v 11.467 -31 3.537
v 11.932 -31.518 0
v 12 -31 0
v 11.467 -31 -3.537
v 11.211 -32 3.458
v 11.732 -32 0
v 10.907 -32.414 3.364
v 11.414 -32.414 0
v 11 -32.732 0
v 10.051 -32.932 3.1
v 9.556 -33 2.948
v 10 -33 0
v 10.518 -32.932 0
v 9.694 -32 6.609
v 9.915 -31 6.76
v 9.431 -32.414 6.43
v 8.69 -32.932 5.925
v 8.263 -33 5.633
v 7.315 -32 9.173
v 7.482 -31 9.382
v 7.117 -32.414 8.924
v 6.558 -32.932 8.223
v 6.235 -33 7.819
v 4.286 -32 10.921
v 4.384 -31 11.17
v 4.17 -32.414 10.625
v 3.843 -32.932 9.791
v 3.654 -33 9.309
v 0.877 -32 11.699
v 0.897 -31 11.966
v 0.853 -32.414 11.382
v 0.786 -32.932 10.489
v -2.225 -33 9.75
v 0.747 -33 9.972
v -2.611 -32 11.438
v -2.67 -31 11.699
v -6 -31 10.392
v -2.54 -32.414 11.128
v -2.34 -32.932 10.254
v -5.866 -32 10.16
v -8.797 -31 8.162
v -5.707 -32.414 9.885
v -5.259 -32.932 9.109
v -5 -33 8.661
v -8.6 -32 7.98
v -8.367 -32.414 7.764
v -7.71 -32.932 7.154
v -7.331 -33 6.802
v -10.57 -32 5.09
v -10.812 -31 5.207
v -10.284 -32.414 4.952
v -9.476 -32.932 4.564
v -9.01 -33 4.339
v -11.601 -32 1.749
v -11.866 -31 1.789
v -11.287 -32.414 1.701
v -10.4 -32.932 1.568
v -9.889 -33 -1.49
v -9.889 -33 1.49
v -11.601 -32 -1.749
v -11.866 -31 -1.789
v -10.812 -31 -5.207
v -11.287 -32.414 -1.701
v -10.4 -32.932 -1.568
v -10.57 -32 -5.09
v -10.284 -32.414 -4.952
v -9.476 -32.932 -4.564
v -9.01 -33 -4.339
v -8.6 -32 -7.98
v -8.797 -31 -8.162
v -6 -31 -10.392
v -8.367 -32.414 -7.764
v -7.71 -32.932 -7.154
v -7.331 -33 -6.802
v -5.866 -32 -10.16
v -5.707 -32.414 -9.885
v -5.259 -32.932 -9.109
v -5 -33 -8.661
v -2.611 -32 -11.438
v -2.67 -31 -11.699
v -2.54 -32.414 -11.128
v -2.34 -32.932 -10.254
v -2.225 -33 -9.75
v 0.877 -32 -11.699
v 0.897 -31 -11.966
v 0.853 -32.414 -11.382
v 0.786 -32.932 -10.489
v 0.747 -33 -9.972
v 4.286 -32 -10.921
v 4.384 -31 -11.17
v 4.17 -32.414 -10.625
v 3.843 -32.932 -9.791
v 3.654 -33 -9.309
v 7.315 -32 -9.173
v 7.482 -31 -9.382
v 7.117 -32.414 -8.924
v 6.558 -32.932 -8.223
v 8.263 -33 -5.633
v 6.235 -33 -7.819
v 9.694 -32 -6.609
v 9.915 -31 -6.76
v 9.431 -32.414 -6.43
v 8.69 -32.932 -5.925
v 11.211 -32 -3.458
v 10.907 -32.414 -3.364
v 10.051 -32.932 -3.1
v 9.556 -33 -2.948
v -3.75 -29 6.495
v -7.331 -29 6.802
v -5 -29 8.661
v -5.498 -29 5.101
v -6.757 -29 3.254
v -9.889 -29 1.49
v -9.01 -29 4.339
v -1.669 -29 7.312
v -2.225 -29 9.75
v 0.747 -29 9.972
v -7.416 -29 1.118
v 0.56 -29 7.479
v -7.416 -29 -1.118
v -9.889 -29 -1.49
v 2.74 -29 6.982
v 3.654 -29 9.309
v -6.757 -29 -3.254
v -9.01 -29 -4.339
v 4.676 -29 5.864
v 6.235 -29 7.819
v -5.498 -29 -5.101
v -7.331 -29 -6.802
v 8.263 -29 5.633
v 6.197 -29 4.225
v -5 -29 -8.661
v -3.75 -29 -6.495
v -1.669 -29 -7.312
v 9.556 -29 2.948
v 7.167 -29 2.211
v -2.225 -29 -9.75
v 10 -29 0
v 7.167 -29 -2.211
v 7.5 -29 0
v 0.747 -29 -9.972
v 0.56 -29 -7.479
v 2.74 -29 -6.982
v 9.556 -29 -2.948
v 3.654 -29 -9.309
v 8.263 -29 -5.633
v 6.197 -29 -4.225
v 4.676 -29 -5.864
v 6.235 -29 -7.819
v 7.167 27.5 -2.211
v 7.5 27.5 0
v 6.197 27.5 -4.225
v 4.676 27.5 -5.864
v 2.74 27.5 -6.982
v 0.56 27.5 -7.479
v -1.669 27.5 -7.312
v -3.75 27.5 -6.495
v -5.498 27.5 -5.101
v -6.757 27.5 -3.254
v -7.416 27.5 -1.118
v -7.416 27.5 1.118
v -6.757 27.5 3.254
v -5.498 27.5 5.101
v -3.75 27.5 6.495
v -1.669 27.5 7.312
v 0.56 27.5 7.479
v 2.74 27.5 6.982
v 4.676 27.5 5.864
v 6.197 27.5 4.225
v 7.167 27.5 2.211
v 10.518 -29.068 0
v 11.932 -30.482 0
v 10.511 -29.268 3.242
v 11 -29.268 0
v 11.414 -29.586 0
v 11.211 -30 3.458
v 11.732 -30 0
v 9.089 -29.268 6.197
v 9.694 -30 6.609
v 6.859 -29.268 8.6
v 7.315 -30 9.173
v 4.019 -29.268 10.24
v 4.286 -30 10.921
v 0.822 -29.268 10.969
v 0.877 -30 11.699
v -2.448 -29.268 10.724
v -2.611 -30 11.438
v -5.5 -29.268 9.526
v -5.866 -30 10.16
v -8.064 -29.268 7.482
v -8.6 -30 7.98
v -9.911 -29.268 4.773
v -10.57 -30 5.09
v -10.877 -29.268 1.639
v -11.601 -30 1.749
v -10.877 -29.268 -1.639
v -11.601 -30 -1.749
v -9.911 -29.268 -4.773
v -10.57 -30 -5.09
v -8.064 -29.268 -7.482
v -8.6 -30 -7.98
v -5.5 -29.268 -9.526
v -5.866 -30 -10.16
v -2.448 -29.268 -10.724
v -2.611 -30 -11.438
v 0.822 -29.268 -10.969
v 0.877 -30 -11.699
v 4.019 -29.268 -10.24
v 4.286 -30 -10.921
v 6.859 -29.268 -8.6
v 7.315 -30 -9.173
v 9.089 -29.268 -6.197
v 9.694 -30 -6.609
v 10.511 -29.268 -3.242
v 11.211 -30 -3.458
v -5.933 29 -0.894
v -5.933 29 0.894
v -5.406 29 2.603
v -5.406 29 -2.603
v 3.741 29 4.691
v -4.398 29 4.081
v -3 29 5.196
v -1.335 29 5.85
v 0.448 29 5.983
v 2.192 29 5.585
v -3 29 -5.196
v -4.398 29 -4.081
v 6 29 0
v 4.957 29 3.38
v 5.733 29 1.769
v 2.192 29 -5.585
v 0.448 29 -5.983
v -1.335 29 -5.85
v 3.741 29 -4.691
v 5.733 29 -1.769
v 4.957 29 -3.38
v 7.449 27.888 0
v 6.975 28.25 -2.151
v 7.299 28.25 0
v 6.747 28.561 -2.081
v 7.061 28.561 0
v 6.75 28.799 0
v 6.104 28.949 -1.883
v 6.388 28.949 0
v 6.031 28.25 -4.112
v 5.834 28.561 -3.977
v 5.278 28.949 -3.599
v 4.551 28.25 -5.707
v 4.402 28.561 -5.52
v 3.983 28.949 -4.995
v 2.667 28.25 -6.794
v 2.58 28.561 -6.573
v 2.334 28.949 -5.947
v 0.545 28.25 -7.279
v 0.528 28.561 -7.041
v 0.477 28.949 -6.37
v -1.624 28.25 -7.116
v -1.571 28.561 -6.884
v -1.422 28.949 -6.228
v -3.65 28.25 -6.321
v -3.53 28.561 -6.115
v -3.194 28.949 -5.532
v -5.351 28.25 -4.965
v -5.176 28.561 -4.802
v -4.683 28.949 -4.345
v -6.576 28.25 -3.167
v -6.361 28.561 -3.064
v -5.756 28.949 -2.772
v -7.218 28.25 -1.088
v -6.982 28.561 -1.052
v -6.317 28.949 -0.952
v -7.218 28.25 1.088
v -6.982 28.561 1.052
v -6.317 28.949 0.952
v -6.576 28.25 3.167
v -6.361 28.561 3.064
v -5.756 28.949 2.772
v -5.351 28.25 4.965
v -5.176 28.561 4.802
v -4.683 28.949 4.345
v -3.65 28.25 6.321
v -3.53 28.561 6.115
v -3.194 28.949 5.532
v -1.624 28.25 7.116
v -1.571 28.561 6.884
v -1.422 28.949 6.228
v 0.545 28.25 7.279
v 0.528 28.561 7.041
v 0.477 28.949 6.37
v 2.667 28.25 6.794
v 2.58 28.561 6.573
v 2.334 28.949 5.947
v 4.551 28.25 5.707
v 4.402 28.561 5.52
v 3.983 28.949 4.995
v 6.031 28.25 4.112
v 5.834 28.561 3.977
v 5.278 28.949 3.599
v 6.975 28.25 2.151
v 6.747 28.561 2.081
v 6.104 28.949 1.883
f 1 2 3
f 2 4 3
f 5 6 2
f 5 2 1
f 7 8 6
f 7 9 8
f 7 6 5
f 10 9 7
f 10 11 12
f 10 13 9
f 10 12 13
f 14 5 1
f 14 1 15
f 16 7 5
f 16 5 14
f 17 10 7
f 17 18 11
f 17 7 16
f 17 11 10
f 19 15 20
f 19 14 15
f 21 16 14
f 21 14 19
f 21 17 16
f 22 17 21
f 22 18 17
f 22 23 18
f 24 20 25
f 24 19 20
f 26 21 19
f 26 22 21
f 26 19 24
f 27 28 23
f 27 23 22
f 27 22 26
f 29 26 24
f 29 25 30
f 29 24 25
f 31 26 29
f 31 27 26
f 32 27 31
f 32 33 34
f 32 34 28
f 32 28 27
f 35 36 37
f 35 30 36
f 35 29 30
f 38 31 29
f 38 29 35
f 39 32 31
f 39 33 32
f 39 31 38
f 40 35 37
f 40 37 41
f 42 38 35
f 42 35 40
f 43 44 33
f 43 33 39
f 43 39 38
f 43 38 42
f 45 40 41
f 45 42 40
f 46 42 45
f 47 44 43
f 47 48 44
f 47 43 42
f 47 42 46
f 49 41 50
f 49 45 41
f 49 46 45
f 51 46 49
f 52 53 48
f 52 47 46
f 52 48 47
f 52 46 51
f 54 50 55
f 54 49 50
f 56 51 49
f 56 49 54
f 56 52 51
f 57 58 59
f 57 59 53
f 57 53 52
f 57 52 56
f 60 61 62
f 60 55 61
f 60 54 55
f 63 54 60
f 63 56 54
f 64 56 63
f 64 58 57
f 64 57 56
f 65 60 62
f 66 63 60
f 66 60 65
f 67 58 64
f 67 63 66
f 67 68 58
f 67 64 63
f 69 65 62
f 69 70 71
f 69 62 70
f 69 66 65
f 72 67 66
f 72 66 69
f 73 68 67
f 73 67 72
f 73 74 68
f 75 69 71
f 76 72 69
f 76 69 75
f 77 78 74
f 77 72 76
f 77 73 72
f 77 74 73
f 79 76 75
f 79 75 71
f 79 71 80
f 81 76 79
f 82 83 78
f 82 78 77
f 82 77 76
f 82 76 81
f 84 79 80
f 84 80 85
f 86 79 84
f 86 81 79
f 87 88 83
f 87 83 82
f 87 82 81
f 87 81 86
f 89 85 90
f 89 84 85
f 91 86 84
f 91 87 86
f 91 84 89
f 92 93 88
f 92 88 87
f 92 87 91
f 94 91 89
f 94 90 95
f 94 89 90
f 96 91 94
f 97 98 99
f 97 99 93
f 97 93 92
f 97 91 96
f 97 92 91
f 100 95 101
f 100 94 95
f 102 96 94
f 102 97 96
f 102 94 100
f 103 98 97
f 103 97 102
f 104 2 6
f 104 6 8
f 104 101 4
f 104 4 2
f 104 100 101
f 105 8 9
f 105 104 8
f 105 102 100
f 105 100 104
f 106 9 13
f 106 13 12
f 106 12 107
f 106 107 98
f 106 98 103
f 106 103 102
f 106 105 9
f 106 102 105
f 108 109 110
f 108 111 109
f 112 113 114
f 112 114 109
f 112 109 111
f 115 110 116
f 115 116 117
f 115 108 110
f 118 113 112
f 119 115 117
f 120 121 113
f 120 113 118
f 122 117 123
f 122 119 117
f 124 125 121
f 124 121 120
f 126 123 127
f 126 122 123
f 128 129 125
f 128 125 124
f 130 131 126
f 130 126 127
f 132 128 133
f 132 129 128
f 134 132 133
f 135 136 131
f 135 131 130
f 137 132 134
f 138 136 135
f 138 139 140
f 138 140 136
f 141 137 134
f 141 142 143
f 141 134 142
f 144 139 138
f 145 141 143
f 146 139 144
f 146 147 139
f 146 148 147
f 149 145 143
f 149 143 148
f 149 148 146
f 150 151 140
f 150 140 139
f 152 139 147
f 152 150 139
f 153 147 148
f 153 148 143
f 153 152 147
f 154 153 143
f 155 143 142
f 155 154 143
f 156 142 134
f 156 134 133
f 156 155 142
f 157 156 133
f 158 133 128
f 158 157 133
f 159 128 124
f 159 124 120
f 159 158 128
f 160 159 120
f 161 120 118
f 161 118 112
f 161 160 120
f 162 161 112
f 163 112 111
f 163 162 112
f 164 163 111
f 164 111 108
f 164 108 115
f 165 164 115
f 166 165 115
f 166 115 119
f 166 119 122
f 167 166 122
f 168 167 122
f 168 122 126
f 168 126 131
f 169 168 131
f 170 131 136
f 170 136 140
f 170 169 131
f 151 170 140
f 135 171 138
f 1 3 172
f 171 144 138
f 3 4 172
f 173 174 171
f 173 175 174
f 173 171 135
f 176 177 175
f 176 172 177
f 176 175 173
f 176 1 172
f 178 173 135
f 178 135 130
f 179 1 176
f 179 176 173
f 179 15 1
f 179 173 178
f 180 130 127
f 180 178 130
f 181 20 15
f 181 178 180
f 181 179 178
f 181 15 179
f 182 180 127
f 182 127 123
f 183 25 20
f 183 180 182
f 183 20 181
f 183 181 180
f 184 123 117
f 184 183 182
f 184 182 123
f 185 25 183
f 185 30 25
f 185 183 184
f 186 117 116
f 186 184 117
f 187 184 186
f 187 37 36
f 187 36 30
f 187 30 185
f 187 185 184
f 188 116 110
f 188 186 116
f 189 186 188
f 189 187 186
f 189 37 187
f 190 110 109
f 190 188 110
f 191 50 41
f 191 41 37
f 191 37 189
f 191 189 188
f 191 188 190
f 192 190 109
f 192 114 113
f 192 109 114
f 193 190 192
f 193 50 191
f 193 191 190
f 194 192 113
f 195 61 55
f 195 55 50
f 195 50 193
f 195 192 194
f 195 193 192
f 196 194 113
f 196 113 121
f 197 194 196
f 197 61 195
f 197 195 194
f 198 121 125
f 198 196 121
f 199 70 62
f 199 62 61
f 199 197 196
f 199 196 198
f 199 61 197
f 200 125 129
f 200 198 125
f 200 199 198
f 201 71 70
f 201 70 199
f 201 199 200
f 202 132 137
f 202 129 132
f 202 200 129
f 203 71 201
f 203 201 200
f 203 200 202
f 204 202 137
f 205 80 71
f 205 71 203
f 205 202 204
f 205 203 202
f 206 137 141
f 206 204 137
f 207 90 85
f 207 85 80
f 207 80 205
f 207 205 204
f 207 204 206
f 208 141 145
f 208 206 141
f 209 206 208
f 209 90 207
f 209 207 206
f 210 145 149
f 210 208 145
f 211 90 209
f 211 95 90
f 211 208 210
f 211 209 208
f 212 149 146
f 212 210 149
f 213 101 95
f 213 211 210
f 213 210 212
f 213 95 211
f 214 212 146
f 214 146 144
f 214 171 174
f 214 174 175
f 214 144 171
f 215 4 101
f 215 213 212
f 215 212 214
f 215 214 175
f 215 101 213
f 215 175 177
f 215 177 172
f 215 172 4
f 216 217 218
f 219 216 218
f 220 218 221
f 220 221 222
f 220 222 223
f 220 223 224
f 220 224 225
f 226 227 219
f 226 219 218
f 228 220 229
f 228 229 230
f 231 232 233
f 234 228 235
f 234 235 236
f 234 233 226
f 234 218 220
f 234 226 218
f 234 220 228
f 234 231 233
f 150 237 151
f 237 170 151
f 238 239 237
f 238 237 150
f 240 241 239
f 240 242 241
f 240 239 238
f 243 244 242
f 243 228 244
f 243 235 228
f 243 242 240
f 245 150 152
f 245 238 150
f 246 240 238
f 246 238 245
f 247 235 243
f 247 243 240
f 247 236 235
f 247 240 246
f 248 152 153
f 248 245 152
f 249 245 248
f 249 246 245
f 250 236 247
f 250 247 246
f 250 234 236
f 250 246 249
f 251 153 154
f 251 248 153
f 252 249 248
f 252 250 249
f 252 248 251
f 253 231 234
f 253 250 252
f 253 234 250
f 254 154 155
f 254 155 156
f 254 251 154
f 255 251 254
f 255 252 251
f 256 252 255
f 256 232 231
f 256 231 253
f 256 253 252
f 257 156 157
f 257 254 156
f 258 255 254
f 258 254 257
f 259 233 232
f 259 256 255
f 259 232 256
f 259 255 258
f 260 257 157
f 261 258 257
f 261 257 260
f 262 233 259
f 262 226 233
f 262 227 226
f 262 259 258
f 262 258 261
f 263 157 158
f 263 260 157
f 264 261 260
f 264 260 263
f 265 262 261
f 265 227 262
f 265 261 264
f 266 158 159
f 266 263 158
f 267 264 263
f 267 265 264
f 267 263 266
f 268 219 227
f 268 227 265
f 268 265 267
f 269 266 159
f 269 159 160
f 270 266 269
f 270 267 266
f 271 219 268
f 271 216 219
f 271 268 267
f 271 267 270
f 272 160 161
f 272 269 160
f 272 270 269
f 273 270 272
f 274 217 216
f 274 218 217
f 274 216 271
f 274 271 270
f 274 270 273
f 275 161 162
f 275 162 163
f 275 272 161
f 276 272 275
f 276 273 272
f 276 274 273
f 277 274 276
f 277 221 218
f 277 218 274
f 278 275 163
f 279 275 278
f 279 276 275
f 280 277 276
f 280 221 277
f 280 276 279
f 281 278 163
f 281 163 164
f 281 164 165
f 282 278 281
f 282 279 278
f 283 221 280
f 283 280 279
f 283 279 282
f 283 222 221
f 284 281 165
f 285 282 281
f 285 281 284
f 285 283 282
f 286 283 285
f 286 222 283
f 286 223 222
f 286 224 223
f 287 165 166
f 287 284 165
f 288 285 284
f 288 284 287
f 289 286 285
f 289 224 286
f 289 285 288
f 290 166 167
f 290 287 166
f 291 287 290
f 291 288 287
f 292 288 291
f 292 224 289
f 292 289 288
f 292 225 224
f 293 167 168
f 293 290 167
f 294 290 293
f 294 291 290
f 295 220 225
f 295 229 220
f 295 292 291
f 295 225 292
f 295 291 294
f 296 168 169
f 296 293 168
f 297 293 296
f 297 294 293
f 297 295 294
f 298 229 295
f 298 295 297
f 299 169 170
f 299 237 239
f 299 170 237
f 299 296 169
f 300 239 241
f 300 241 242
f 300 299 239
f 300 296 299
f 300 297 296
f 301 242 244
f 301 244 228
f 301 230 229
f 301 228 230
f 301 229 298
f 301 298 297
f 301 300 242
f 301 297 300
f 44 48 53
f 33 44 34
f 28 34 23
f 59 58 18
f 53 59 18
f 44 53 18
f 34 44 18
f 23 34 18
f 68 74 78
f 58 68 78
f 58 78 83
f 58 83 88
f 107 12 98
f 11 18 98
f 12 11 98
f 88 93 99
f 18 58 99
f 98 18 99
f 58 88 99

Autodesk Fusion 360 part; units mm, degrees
sketch "Sketch1" plane through (0, 0, 0) normal (0, 1, 0) x (1, 0, 0)
  circle A0 centre (0, 0) radius 7.5
  circle A1 centre (0, 0) radius 12
  dimension "d1" = 15
  dimension "d2" = 24
extrude "Extrude1" add sketch "Sketch1" along normal mid plane 58 contours A0 makes body 1
extrude "Extrude2" add sketch "Sketch1" along normal blind 0 and the other way blind 4 from surface at -29 contours A0 | A1 bodies 1
fillet "Fillet1" radius 2 2 edges at (-11.1879, -33, -4.3394) (-11.1879, -29, 4.3394) on bodies 1
copy_body "Body->Comp1" bodies 1 removing the originals makes body 2 in component "Component"
fillet "Fillet1'" radius 1.5 1 edges at (-6.9925, 29, 2.7121) on bodies 2 in component "Component"
component "Component" placed x (1, 0, 0) y (0, 1, 0) z (0, 0, 1) at (0, 0, 0)
